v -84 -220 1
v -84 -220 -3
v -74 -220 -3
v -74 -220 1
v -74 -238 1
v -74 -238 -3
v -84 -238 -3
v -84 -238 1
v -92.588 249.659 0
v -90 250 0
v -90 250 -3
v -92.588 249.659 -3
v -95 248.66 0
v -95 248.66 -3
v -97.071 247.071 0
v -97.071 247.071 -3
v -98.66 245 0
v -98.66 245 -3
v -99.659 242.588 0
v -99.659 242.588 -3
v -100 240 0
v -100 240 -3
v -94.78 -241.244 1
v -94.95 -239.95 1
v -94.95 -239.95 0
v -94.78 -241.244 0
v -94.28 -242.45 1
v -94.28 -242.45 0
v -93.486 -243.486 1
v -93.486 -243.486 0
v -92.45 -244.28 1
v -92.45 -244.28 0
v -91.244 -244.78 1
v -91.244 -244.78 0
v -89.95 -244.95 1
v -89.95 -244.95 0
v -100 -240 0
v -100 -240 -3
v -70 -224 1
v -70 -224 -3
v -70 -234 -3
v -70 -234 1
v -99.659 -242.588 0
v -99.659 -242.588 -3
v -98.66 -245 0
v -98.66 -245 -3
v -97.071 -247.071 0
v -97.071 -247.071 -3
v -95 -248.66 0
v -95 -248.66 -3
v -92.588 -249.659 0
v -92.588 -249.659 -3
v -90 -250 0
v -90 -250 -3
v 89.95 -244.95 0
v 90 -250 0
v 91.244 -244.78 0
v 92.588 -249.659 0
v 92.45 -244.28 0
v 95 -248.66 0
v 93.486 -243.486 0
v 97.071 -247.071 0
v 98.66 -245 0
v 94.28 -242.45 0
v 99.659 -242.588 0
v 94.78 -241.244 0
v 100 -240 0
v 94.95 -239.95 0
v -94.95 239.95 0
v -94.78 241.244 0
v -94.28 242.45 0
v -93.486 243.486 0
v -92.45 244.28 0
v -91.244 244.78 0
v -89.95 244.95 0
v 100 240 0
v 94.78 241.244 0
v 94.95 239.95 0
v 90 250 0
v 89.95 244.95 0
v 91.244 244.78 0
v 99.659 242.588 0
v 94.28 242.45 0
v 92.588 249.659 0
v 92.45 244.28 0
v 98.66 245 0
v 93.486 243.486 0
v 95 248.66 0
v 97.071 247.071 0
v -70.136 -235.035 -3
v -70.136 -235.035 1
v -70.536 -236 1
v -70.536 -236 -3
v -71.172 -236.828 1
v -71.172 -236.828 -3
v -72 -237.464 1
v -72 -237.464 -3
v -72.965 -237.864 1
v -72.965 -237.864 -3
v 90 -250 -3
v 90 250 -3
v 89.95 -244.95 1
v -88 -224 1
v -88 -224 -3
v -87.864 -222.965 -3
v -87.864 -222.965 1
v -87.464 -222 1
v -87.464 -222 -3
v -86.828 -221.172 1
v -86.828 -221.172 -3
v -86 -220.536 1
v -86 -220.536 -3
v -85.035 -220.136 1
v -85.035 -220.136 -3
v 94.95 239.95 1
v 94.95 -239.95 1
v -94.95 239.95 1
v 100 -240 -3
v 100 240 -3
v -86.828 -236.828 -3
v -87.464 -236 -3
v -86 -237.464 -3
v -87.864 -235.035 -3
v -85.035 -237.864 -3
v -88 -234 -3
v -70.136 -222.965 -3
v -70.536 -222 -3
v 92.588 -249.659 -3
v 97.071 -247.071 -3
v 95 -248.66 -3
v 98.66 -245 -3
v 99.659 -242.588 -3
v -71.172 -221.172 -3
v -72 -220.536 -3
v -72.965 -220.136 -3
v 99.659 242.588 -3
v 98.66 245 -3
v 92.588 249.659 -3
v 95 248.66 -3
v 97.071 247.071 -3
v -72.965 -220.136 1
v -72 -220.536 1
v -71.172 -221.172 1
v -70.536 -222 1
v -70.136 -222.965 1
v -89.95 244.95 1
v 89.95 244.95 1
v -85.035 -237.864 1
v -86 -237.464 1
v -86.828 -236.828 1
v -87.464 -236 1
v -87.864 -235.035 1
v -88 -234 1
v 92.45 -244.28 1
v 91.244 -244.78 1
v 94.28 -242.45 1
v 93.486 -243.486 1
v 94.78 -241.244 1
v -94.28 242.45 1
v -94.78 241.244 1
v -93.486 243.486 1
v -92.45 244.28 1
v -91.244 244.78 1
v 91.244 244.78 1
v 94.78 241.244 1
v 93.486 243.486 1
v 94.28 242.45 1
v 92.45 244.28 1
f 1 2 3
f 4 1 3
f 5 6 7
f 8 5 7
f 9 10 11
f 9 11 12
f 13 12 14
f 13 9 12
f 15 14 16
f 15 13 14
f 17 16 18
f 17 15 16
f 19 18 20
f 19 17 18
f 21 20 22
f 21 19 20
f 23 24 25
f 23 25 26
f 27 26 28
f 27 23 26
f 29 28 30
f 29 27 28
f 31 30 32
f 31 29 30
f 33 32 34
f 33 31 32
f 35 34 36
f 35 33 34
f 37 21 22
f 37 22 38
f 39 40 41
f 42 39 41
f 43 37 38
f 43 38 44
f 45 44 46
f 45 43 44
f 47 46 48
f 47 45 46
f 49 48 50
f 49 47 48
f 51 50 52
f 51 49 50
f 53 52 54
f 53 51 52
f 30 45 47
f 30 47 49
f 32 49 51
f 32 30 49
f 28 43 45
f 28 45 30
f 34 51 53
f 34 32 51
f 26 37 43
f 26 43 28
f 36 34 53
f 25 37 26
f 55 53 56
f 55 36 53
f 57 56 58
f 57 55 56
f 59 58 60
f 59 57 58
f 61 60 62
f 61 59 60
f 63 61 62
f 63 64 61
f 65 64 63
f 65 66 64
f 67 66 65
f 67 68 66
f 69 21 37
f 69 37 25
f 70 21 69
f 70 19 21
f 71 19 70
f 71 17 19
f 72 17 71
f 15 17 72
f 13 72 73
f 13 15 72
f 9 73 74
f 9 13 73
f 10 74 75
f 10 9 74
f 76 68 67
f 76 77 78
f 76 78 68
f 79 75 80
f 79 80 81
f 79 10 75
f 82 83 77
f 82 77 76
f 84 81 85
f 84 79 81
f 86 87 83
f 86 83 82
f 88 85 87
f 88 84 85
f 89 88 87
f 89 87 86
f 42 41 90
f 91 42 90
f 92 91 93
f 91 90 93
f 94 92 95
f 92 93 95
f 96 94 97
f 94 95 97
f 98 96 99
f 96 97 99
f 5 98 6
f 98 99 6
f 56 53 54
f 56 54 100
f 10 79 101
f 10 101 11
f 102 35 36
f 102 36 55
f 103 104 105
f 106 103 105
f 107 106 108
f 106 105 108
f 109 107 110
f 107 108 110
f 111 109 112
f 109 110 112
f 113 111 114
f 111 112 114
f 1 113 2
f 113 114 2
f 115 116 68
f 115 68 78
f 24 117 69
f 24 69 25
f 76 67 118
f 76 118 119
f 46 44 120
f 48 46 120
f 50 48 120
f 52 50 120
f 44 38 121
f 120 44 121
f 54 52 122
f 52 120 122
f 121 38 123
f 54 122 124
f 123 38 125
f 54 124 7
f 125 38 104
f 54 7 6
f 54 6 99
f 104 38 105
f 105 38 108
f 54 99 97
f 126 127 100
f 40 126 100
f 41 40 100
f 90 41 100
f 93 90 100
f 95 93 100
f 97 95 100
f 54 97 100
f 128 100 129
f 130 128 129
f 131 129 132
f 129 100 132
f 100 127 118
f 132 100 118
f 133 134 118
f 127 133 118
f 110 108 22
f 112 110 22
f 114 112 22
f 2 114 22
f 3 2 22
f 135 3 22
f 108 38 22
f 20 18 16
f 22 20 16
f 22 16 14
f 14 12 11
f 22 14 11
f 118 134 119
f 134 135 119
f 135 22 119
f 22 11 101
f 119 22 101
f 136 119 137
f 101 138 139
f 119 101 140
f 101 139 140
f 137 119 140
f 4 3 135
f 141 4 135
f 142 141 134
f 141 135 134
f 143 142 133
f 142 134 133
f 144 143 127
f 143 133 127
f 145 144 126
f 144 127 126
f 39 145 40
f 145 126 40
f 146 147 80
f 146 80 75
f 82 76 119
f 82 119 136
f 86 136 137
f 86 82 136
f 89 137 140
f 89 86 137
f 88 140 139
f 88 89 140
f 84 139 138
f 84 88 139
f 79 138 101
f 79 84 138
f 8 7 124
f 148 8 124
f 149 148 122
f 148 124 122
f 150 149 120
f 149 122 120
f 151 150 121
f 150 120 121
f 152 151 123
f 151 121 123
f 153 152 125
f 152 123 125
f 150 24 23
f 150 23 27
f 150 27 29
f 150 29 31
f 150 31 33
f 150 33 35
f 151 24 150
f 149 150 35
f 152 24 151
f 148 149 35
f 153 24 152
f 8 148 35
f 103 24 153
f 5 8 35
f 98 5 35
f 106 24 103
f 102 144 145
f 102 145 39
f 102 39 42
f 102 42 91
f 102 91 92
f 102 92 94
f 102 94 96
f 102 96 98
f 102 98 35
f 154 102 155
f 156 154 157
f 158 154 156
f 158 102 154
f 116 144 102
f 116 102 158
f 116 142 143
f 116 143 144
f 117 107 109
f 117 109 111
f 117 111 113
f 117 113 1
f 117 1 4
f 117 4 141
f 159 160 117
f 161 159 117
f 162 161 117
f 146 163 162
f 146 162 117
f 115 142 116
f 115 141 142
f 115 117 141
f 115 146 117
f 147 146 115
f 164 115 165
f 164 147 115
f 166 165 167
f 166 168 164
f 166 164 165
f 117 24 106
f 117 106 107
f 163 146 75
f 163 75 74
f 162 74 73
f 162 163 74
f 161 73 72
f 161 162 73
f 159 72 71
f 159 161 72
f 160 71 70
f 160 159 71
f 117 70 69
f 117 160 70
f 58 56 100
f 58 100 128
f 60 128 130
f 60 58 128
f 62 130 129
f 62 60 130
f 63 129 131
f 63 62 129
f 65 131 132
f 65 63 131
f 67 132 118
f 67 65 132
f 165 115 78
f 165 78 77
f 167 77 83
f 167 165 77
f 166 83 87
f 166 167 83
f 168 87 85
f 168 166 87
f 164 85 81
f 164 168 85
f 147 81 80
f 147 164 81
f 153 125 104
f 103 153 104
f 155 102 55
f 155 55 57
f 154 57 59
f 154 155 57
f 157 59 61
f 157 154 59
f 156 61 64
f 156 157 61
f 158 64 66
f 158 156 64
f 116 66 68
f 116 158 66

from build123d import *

# Parameters (mm, degrees)
PAD004_DEPTH    = 4
POCKET003_DEPTH = 1
POCKET006_DEPTH = 4


with BuildPart() as part:
    # Sketch010 → Pad004 (new body)
    with BuildSketch(Plane.XY):
        with BuildLine():
            Line((-100, 240), (-100, -240))
            ThreePointArc((-100, -240), (-97.0710678119, -247.0710678119), (-90, -250))
            Line((-90, -250), (90, -250))
            ThreePointArc((90, -250), (97.0710678119, -247.0710678119), (100, -240))
            Line((100, -240), (100, 240))
            ThreePointArc((100, 240), (97.0710678119, 247.0710678119), (90, 250))
            Line((90, 250), (-90, 250))
            ThreePointArc((-90, 250), (-97.0710678119, 247.0710678119), (-100, 240))
        make_face()
    extrude(amount=-PAD004_DEPTH)

    # Sketch011 (on Face9 of Pad004) → Pocket003 (cut)
    with BuildSketch(Plane.XY):
        with BuildLine():
            Line((-100, 240), (-100, -240))
            ThreePointArc((-100, -240), (-97.0710678119, -247.0710678119), (-90, -250))
            Line((-90, -250), (90, -250))
            ThreePointArc((90, -250), (97.0710678119, -247.0710678119), (100, -240))
            Line((100, -240), (100, 240))
            ThreePointArc((100, 240), (97.0710678119, 247.0710678119), (90, 250))
            Line((90, 250), (-90, 250))
            ThreePointArc((-90, 250), (-97.0710678119, 247.0710678119), (-100, 240))
        make_face()
        with BuildLine():
            Line((-94.95, 239.95), (-94.95, -239.95))
            ThreePointArc((-94.95, -239.95), (-93.4855339059, -243.4855339059), (-89.95, -244.95))
            Line((-89.95, -244.95), (89.95, -244.95))
            ThreePointArc((89.95, -244.95), (93.4855339059, -243.4855339059), (94.95, -239.95))
            Line((94.95, -239.95), (94.95, 239.95))
            ThreePointArc((94.95, 239.95), (93.4855339059, 243.4855339059), (89.95, 244.95))
            Line((89.95, 244.95), (-89.95, 244.95))
            ThreePointArc((-89.95, 244.95), (-93.4855339059, 243.4855339059), (-94.95, 239.95))
        make_face(mode=Mode.SUBTRACT)
    extrude(amount=-POCKET003_DEPTH, mode=Mode.SUBTRACT)

    # Sketch014 (on Face4 of Pocket003) → Pocket006 (cut)
    with BuildSketch(Plane(origin=(0, 0, -4), x_dir=(1, 0, 0), z_dir=(0, 0, -1))):
        with BuildLine():
            Line((-88, 234), (-88, 224))
            ThreePointArc((-88, 224), (-86.8284271247, 221.1715728753), (-84, 220))
            Line((-84, 220), (-74, 220))
            ThreePointArc((-74, 220), (-71.1715728753, 221.1715728753), (-70, 224))
            Line((-70, 224), (-70, 234))
            ThreePointArc((-70, 234), (-71.1715728753, 236.8284271247), (-74, 238))
            Line((-74, 238), (-84, 238))
            ThreePointArc((-84, 238), (-86.8284271247, 236.8284271247), (-88, 234))
        make_face()
    extrude(amount=-POCKET006_DEPTH, mode=Mode.SUBTRACT)


with BuildPart() as part_1:
    # Body002 placement: moved
    add(part.part.moved(Location((0, 0, 1))))


solid = part_1.part
